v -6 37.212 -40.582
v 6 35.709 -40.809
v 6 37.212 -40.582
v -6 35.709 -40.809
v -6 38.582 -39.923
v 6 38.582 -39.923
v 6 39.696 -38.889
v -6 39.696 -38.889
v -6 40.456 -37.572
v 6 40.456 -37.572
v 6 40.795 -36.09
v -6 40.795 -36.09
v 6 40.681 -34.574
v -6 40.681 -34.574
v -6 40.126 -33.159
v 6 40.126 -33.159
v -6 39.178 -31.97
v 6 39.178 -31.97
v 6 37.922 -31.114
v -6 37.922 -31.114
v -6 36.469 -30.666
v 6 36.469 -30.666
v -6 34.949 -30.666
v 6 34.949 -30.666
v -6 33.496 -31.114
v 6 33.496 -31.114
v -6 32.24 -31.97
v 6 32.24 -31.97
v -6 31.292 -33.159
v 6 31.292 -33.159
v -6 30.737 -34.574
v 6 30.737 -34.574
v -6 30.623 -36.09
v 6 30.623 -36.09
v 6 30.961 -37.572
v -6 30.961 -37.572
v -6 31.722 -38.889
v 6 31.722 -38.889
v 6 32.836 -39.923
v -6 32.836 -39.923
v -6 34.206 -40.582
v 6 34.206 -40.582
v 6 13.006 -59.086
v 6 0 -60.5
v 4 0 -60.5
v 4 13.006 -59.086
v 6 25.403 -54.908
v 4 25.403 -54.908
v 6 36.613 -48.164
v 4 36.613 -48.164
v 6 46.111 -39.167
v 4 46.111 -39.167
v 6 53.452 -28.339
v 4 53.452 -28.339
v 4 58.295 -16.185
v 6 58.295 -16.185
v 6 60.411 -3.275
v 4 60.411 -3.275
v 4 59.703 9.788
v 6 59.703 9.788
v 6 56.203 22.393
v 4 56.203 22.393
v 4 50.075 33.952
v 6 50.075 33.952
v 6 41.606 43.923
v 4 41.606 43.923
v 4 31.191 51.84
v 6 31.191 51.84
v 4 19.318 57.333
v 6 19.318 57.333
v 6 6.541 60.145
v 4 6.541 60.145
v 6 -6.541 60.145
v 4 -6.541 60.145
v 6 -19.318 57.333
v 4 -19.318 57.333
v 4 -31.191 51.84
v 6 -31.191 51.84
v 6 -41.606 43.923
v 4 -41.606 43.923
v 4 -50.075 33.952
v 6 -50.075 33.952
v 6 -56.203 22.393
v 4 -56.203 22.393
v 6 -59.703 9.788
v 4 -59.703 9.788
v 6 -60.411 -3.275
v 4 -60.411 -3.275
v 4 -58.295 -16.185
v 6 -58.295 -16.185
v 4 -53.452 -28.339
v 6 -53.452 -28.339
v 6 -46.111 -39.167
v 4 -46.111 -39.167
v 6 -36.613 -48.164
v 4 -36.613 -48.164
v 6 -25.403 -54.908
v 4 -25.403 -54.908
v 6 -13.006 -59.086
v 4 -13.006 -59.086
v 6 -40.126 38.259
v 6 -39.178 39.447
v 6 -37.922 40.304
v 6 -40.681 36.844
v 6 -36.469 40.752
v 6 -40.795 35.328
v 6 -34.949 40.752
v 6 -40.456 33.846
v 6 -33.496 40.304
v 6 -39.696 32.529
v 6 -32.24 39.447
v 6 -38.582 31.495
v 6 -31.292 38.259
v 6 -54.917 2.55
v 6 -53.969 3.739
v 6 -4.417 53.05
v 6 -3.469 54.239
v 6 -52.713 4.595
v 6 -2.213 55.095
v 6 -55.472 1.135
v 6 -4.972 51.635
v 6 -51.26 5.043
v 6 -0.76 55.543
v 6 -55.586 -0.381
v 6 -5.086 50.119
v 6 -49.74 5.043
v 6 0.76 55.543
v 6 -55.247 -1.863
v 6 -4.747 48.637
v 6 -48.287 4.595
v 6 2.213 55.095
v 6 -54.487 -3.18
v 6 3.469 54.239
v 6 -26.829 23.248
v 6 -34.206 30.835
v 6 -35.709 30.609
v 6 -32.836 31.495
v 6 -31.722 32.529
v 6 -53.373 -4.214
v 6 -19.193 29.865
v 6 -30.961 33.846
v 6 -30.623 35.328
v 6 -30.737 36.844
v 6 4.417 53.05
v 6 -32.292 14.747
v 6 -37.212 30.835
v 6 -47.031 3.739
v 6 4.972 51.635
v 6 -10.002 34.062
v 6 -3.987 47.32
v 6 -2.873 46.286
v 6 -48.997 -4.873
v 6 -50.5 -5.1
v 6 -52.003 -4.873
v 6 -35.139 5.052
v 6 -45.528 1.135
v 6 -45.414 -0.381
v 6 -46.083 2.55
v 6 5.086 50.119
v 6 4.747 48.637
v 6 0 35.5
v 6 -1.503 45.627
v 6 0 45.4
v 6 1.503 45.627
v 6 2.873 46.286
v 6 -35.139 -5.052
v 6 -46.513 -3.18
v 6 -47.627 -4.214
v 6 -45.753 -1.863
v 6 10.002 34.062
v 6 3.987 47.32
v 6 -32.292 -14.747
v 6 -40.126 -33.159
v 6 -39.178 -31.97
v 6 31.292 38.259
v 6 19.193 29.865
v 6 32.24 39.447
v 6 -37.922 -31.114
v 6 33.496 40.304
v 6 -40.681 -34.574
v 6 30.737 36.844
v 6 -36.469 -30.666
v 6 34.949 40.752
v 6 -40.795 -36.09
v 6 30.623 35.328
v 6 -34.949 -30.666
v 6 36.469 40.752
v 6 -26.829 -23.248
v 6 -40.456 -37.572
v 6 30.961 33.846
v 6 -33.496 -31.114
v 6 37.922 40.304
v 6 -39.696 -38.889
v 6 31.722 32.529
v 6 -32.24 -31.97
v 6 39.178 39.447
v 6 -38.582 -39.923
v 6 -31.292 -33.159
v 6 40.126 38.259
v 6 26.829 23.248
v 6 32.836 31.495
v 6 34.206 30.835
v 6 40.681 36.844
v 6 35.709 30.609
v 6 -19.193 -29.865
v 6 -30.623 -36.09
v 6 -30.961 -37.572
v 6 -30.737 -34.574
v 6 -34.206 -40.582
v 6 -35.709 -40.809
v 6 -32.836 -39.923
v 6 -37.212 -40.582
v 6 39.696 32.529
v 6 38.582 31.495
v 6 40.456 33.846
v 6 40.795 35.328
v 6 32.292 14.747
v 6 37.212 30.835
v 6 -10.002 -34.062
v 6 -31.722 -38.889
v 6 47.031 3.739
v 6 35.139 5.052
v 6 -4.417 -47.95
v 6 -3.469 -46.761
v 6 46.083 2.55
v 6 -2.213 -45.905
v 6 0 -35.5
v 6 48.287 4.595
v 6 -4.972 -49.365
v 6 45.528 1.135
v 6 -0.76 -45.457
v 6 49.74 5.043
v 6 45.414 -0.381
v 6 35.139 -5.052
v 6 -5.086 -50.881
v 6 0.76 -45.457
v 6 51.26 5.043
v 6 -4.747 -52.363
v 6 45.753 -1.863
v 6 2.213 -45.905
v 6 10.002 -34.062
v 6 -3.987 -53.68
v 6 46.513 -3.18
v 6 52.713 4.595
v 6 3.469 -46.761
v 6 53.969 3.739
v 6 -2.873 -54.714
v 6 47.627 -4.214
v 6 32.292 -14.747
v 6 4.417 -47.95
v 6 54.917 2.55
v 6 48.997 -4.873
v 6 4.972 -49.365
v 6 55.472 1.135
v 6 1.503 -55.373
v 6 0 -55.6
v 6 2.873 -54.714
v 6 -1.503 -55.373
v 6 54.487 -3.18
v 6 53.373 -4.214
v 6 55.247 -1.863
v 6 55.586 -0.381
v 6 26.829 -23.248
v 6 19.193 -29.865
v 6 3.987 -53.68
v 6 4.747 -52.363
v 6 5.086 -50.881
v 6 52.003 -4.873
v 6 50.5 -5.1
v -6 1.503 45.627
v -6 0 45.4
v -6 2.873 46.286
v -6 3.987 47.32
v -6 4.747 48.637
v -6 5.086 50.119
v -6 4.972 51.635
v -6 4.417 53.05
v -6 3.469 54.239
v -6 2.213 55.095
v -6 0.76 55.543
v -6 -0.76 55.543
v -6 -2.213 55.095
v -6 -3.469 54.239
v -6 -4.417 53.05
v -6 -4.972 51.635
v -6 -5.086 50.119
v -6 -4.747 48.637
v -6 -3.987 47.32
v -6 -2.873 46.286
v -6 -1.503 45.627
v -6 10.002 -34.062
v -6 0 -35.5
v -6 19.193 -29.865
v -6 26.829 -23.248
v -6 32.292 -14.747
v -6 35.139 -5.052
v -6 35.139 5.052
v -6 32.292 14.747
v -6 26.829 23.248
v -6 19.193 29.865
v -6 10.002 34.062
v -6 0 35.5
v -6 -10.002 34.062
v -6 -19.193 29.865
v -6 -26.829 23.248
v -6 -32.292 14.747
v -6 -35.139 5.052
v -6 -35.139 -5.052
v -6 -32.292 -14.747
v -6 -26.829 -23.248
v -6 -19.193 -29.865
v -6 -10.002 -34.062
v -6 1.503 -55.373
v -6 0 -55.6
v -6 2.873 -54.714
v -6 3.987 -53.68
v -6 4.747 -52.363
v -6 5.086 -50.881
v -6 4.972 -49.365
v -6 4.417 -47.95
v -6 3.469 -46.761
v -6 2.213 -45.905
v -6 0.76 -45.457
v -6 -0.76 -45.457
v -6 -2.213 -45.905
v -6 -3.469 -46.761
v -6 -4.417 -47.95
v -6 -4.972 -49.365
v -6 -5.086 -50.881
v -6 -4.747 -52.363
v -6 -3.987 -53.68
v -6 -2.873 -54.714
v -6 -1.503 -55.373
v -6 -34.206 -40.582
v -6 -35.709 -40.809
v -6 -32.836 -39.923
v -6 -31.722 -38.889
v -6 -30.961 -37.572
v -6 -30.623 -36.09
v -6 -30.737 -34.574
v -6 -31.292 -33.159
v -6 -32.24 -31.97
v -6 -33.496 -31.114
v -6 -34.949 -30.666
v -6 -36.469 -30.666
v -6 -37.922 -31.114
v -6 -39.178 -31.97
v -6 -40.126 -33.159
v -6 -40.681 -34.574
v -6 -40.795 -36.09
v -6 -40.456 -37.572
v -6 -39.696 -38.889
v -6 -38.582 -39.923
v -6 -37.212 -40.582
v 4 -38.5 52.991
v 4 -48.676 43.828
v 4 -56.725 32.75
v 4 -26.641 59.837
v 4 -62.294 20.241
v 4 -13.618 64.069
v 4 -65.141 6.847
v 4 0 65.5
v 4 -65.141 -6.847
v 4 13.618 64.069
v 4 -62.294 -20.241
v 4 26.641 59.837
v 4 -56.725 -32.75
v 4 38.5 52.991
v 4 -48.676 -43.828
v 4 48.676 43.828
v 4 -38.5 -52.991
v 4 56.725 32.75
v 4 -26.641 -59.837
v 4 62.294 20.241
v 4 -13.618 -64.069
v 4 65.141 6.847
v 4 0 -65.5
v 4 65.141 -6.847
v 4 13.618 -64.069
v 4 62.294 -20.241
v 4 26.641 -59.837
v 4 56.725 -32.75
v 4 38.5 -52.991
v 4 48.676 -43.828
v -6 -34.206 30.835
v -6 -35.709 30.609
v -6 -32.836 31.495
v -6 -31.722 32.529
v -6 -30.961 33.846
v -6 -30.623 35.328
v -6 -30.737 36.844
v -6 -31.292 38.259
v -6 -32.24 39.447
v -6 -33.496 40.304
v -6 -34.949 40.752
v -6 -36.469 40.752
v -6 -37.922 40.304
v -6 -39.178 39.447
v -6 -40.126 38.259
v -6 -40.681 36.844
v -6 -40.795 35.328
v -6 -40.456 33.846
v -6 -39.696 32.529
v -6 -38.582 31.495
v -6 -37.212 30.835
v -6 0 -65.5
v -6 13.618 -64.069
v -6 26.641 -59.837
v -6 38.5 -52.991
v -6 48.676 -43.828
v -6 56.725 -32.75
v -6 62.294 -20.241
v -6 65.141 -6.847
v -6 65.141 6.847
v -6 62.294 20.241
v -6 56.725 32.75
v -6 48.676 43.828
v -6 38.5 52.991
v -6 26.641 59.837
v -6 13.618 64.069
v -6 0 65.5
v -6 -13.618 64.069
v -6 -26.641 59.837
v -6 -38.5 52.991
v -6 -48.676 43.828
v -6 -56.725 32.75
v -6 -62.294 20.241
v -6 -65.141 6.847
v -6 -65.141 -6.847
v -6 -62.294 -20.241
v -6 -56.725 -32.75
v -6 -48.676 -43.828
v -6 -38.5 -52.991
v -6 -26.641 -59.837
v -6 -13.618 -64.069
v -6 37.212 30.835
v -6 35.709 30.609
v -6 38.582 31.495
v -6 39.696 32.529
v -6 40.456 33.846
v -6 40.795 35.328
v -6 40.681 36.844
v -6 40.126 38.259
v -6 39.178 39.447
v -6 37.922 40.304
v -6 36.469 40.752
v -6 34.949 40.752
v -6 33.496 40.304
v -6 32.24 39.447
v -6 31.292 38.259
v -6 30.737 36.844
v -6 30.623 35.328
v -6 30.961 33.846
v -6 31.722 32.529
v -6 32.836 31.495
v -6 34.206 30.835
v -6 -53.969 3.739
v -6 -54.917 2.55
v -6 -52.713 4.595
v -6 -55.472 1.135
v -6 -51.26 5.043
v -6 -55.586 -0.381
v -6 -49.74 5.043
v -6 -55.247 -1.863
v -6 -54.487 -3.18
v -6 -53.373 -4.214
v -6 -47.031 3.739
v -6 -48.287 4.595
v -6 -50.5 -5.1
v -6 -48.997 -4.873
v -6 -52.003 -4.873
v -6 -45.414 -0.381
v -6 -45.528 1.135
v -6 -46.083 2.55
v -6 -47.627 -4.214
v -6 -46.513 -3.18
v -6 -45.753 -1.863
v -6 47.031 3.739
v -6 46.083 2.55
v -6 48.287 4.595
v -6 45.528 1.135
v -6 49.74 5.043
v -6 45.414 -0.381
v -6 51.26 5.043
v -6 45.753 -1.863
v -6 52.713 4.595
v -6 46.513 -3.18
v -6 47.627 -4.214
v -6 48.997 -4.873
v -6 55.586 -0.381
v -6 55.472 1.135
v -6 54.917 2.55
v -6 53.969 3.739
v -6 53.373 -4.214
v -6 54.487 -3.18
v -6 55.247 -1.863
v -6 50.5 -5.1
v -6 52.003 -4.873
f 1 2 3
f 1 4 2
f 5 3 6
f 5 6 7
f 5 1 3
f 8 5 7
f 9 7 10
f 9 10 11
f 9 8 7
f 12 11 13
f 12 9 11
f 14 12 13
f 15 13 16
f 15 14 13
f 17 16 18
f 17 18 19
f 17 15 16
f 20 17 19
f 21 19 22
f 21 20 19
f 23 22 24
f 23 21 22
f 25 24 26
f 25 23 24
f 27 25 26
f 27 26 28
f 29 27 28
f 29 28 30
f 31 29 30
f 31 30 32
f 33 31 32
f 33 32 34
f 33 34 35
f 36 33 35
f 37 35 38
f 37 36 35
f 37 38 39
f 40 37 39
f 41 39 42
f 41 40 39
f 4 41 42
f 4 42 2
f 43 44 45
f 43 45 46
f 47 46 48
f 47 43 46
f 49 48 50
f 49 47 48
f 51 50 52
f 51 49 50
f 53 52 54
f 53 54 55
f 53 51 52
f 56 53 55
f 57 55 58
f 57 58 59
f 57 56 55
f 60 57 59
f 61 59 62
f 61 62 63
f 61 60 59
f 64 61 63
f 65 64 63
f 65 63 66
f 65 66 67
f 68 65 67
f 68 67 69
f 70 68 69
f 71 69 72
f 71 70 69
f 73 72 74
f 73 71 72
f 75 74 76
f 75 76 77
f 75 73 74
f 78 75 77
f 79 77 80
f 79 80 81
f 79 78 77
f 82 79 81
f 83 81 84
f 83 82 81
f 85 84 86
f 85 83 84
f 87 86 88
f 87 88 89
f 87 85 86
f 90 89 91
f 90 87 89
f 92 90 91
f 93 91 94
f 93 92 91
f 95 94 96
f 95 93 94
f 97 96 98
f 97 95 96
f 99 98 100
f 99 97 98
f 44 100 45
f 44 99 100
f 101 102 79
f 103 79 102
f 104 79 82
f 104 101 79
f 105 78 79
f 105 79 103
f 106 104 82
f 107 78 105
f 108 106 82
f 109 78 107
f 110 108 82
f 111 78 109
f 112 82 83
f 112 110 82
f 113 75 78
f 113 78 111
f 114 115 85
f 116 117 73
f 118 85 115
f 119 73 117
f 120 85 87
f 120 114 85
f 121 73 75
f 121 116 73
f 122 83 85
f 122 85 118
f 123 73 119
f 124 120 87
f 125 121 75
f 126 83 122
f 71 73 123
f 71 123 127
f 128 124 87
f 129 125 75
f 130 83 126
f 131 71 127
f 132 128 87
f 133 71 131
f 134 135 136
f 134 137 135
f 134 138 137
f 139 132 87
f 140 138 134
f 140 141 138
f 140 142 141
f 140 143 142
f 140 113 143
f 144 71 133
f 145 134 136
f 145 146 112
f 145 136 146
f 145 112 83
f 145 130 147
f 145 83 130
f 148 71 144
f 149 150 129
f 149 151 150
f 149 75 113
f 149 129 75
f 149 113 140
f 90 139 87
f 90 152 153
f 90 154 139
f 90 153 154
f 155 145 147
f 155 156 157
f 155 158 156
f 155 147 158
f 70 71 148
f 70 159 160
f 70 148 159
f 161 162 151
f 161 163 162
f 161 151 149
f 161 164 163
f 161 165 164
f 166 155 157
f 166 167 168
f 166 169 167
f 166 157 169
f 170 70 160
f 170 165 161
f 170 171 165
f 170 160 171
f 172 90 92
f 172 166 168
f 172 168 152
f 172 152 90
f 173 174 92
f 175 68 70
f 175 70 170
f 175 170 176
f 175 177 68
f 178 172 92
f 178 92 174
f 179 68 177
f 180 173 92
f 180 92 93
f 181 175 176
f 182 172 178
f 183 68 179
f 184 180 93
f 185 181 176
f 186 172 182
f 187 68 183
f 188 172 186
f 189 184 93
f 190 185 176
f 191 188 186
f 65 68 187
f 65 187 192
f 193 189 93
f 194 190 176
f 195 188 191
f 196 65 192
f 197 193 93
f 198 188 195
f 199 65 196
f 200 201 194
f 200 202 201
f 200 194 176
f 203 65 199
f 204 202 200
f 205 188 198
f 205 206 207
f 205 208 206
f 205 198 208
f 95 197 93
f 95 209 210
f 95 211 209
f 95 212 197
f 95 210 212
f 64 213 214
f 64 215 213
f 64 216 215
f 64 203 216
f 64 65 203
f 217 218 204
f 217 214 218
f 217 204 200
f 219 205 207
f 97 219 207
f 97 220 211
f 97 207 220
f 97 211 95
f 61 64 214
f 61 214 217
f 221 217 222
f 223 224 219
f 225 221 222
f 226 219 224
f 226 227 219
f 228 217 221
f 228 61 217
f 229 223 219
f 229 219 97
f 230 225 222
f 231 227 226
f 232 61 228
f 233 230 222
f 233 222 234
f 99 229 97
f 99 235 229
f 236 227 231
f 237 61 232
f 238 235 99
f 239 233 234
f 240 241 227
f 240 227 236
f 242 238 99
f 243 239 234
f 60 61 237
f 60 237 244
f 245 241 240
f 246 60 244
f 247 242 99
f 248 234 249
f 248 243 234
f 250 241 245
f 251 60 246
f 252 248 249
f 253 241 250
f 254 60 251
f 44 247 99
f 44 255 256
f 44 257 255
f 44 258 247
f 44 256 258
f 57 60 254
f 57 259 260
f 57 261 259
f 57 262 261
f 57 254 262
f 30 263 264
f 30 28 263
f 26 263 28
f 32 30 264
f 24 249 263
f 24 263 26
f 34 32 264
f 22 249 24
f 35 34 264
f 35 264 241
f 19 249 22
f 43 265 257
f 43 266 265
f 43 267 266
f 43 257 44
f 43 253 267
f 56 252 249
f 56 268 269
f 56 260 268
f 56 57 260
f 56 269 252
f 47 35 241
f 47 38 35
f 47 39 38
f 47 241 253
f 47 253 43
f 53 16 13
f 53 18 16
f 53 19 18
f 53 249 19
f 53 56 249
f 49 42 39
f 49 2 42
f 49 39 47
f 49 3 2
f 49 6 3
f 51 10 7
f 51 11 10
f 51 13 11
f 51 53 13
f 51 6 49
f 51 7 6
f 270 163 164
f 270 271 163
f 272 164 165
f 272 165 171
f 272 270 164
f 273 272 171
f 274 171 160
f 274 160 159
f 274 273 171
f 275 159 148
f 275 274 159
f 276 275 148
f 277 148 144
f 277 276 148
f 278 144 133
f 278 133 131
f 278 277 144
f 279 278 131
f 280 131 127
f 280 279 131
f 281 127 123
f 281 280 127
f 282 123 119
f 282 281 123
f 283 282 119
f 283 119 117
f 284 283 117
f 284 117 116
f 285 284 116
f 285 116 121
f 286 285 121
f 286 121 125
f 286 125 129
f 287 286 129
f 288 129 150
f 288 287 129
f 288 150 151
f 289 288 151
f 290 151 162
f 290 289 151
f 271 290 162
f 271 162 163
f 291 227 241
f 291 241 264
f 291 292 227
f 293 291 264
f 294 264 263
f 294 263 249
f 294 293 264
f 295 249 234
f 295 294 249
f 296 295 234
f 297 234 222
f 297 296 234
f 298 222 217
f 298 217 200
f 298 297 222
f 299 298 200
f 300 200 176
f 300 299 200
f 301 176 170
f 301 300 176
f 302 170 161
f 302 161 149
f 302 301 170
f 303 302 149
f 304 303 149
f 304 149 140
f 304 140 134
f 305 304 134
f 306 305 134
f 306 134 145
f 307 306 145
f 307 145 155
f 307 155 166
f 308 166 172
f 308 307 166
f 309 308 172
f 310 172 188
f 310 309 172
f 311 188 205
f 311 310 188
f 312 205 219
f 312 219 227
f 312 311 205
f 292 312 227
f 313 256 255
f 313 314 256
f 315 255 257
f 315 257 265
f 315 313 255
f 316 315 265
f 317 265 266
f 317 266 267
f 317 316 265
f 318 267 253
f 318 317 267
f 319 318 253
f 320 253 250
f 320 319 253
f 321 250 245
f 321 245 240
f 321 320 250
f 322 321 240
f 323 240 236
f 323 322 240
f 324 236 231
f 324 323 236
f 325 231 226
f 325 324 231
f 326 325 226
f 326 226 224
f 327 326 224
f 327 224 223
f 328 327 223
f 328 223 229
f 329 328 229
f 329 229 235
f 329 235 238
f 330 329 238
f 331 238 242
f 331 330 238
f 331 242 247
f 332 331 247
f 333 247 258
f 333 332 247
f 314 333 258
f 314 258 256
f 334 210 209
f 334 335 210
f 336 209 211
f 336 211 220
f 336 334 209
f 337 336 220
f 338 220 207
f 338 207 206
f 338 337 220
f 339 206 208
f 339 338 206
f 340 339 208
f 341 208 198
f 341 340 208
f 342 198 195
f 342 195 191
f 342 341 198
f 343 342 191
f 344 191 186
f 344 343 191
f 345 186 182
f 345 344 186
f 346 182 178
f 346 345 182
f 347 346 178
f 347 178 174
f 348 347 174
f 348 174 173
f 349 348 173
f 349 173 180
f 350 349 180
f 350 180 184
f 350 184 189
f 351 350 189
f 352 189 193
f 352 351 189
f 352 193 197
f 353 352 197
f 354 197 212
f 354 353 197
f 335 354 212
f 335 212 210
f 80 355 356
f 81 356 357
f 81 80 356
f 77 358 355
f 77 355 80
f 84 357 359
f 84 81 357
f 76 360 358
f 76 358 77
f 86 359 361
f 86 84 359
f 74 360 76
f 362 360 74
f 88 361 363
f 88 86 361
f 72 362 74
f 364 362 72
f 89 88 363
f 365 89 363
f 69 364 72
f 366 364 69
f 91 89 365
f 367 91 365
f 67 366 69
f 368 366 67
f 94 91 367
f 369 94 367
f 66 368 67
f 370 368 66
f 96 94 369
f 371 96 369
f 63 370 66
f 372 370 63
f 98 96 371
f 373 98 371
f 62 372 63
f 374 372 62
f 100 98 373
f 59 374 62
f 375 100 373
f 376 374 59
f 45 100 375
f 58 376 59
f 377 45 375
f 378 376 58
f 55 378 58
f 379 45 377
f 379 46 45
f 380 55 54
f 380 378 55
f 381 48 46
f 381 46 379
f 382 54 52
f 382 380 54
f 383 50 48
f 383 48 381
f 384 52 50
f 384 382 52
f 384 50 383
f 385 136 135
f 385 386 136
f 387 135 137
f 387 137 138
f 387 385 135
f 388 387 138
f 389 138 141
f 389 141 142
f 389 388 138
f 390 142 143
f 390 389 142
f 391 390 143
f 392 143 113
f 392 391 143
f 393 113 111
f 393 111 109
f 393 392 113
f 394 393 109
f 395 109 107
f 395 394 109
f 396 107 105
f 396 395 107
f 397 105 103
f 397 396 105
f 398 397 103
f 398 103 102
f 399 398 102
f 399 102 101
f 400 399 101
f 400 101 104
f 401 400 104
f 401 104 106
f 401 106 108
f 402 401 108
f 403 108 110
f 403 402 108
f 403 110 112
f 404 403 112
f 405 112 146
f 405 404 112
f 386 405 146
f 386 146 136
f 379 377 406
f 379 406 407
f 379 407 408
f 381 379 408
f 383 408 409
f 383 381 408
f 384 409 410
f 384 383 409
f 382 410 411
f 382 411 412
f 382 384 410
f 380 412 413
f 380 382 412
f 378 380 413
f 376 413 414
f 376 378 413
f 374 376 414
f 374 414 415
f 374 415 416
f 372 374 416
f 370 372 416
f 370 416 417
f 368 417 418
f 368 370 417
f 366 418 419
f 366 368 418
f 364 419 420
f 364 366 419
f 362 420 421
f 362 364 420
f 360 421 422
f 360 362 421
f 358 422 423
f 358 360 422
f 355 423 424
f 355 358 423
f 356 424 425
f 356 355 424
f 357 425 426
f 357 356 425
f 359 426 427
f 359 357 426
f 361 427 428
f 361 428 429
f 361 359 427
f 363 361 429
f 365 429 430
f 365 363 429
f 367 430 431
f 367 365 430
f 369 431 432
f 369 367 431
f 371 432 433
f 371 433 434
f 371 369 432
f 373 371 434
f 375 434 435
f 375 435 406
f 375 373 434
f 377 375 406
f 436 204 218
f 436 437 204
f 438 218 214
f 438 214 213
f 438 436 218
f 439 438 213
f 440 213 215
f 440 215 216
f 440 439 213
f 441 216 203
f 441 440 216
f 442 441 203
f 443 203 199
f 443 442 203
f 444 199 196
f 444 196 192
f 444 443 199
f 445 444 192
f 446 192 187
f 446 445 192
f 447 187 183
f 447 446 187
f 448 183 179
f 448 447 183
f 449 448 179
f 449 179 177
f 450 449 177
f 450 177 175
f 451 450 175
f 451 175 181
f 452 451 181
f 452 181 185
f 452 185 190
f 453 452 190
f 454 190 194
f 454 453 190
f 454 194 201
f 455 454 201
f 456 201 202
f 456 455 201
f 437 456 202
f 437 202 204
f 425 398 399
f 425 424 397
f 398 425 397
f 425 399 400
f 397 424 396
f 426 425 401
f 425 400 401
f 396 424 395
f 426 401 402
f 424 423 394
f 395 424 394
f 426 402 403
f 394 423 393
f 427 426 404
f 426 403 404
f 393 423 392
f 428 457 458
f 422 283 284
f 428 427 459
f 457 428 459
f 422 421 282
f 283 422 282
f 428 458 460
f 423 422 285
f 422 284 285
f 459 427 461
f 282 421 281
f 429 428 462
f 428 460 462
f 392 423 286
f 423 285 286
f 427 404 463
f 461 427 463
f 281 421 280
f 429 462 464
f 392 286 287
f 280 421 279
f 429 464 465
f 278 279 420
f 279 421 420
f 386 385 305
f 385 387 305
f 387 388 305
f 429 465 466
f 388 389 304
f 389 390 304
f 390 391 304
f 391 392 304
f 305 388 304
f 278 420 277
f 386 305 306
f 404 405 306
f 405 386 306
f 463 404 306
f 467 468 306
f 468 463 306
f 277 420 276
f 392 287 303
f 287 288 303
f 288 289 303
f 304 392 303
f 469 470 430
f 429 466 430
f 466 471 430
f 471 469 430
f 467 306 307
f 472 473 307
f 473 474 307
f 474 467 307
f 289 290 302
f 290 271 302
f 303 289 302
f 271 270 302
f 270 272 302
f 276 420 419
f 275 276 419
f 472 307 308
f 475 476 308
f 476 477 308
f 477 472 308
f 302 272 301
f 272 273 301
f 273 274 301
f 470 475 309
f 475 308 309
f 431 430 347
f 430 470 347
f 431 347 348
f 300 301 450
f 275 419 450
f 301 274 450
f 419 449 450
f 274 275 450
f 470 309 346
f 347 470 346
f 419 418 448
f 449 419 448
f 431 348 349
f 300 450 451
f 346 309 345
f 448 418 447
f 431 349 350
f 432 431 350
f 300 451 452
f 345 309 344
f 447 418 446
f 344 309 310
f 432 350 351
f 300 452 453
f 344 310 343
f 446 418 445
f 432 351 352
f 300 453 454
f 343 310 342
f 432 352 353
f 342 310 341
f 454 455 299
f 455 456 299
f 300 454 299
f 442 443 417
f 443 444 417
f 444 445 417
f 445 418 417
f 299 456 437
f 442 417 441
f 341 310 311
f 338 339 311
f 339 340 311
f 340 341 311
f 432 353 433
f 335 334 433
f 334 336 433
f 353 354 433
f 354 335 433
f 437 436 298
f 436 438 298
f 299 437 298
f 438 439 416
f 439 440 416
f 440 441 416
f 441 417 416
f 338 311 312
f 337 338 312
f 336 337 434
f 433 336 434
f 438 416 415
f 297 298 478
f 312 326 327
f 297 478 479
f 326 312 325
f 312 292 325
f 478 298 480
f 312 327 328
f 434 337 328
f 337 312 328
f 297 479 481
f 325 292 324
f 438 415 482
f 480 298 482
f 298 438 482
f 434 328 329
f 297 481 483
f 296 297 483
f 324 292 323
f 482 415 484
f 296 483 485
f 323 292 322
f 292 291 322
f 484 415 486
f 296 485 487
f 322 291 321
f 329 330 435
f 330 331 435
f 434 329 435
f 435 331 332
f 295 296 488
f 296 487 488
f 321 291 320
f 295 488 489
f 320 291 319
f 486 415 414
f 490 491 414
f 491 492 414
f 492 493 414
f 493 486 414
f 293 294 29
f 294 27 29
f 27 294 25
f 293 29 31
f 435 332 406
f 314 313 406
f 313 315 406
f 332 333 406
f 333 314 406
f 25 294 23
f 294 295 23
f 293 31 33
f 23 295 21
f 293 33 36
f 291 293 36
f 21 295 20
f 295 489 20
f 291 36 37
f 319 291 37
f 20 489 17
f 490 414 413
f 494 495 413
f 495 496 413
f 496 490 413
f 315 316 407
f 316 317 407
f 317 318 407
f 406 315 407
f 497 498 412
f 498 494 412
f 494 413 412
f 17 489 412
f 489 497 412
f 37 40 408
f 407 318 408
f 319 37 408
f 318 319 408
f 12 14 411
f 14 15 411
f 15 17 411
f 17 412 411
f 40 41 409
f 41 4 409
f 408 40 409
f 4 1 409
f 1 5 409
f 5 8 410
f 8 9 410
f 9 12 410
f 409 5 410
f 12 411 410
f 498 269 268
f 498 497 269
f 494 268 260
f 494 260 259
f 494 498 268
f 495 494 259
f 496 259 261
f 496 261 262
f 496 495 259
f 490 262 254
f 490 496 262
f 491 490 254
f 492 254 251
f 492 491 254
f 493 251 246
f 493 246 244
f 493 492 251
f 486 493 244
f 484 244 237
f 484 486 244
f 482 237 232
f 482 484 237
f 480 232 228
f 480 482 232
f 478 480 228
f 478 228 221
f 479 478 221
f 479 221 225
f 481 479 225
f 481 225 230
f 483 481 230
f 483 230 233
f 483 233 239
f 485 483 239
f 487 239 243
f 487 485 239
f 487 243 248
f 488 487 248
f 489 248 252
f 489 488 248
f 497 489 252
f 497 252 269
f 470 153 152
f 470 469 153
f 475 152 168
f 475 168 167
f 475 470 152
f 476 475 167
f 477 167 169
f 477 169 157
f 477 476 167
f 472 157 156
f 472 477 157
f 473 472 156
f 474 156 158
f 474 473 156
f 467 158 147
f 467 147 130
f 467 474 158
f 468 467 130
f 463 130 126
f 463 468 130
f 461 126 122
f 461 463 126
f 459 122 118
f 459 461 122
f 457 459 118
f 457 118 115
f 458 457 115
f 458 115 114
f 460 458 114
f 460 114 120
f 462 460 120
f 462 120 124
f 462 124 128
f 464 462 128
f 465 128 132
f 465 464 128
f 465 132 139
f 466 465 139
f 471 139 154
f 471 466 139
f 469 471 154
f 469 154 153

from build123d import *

# Parameters (mm, degrees)
SKETCH_1_R          = 65.5
SKETCH_1_R_2        = 35.5
SKETCH_1_R_3        = 5.1
EXTRUDE_1_DEPTH     = 6
SKETCH_2_R          = 65.5
SKETCH_2_R_2        = 60.5
CUT_EXTRUDE_1_DEPTH = 2


with BuildPart() as part:
    # Эскиз1 → Бобышка-Вытянуть1 (new, symmetric)
    with BuildSketch(Plane(origin=(0, 0, 0), x_dir=(0, 0, -1), z_dir=(1, 0, 0))):
        Circle(SKETCH_1_R)
        Circle(SKETCH_1_R_2, mode=Mode.SUBTRACT)
        with Locations((0, 50.5)):
            Circle(SKETCH_1_R_3, mode=Mode.SUBTRACT)
        with Locations((35.70889245, 35.70889245)):
            Circle(SKETCH_1_R_3, mode=Mode.SUBTRACT)
        with Locations((50.5, 0)):
            Circle(SKETCH_1_R_3, mode=Mode.SUBTRACT)
        with Locations((35.70889245, -35.70889245)):
            Circle(SKETCH_1_R_3, mode=Mode.SUBTRACT)
        with Locations((0, -50.5)):
            Circle(SKETCH_1_R_3, mode=Mode.SUBTRACT)
        with Locations((-35.70889245, -35.70889245)):
            Circle(SKETCH_1_R_3, mode=Mode.SUBTRACT)
        with Locations((-50.5, 0)):
            Circle(SKETCH_1_R_3, mode=Mode.SUBTRACT)
        with Locations((-35.70889245, 35.70889245)):
            Circle(SKETCH_1_R_3, mode=Mode.SUBTRACT)
    extrude(amount=EXTRUDE_1_DEPTH, both=True)

    # Эскиз2 → Вырез-Вытянуть1 (cut)
    with BuildSketch(Plane(origin=(6, 0, 0), x_dir=(0, 0, -1), z_dir=(1, 0, 0))):
        Circle(SKETCH_2_R)
        Circle(SKETCH_2_R_2, mode=Mode.SUBTRACT)
    extrude(amount=-CUT_EXTRUDE_1_DEPTH, mode=Mode.SUBTRACT)


solid = part.part
